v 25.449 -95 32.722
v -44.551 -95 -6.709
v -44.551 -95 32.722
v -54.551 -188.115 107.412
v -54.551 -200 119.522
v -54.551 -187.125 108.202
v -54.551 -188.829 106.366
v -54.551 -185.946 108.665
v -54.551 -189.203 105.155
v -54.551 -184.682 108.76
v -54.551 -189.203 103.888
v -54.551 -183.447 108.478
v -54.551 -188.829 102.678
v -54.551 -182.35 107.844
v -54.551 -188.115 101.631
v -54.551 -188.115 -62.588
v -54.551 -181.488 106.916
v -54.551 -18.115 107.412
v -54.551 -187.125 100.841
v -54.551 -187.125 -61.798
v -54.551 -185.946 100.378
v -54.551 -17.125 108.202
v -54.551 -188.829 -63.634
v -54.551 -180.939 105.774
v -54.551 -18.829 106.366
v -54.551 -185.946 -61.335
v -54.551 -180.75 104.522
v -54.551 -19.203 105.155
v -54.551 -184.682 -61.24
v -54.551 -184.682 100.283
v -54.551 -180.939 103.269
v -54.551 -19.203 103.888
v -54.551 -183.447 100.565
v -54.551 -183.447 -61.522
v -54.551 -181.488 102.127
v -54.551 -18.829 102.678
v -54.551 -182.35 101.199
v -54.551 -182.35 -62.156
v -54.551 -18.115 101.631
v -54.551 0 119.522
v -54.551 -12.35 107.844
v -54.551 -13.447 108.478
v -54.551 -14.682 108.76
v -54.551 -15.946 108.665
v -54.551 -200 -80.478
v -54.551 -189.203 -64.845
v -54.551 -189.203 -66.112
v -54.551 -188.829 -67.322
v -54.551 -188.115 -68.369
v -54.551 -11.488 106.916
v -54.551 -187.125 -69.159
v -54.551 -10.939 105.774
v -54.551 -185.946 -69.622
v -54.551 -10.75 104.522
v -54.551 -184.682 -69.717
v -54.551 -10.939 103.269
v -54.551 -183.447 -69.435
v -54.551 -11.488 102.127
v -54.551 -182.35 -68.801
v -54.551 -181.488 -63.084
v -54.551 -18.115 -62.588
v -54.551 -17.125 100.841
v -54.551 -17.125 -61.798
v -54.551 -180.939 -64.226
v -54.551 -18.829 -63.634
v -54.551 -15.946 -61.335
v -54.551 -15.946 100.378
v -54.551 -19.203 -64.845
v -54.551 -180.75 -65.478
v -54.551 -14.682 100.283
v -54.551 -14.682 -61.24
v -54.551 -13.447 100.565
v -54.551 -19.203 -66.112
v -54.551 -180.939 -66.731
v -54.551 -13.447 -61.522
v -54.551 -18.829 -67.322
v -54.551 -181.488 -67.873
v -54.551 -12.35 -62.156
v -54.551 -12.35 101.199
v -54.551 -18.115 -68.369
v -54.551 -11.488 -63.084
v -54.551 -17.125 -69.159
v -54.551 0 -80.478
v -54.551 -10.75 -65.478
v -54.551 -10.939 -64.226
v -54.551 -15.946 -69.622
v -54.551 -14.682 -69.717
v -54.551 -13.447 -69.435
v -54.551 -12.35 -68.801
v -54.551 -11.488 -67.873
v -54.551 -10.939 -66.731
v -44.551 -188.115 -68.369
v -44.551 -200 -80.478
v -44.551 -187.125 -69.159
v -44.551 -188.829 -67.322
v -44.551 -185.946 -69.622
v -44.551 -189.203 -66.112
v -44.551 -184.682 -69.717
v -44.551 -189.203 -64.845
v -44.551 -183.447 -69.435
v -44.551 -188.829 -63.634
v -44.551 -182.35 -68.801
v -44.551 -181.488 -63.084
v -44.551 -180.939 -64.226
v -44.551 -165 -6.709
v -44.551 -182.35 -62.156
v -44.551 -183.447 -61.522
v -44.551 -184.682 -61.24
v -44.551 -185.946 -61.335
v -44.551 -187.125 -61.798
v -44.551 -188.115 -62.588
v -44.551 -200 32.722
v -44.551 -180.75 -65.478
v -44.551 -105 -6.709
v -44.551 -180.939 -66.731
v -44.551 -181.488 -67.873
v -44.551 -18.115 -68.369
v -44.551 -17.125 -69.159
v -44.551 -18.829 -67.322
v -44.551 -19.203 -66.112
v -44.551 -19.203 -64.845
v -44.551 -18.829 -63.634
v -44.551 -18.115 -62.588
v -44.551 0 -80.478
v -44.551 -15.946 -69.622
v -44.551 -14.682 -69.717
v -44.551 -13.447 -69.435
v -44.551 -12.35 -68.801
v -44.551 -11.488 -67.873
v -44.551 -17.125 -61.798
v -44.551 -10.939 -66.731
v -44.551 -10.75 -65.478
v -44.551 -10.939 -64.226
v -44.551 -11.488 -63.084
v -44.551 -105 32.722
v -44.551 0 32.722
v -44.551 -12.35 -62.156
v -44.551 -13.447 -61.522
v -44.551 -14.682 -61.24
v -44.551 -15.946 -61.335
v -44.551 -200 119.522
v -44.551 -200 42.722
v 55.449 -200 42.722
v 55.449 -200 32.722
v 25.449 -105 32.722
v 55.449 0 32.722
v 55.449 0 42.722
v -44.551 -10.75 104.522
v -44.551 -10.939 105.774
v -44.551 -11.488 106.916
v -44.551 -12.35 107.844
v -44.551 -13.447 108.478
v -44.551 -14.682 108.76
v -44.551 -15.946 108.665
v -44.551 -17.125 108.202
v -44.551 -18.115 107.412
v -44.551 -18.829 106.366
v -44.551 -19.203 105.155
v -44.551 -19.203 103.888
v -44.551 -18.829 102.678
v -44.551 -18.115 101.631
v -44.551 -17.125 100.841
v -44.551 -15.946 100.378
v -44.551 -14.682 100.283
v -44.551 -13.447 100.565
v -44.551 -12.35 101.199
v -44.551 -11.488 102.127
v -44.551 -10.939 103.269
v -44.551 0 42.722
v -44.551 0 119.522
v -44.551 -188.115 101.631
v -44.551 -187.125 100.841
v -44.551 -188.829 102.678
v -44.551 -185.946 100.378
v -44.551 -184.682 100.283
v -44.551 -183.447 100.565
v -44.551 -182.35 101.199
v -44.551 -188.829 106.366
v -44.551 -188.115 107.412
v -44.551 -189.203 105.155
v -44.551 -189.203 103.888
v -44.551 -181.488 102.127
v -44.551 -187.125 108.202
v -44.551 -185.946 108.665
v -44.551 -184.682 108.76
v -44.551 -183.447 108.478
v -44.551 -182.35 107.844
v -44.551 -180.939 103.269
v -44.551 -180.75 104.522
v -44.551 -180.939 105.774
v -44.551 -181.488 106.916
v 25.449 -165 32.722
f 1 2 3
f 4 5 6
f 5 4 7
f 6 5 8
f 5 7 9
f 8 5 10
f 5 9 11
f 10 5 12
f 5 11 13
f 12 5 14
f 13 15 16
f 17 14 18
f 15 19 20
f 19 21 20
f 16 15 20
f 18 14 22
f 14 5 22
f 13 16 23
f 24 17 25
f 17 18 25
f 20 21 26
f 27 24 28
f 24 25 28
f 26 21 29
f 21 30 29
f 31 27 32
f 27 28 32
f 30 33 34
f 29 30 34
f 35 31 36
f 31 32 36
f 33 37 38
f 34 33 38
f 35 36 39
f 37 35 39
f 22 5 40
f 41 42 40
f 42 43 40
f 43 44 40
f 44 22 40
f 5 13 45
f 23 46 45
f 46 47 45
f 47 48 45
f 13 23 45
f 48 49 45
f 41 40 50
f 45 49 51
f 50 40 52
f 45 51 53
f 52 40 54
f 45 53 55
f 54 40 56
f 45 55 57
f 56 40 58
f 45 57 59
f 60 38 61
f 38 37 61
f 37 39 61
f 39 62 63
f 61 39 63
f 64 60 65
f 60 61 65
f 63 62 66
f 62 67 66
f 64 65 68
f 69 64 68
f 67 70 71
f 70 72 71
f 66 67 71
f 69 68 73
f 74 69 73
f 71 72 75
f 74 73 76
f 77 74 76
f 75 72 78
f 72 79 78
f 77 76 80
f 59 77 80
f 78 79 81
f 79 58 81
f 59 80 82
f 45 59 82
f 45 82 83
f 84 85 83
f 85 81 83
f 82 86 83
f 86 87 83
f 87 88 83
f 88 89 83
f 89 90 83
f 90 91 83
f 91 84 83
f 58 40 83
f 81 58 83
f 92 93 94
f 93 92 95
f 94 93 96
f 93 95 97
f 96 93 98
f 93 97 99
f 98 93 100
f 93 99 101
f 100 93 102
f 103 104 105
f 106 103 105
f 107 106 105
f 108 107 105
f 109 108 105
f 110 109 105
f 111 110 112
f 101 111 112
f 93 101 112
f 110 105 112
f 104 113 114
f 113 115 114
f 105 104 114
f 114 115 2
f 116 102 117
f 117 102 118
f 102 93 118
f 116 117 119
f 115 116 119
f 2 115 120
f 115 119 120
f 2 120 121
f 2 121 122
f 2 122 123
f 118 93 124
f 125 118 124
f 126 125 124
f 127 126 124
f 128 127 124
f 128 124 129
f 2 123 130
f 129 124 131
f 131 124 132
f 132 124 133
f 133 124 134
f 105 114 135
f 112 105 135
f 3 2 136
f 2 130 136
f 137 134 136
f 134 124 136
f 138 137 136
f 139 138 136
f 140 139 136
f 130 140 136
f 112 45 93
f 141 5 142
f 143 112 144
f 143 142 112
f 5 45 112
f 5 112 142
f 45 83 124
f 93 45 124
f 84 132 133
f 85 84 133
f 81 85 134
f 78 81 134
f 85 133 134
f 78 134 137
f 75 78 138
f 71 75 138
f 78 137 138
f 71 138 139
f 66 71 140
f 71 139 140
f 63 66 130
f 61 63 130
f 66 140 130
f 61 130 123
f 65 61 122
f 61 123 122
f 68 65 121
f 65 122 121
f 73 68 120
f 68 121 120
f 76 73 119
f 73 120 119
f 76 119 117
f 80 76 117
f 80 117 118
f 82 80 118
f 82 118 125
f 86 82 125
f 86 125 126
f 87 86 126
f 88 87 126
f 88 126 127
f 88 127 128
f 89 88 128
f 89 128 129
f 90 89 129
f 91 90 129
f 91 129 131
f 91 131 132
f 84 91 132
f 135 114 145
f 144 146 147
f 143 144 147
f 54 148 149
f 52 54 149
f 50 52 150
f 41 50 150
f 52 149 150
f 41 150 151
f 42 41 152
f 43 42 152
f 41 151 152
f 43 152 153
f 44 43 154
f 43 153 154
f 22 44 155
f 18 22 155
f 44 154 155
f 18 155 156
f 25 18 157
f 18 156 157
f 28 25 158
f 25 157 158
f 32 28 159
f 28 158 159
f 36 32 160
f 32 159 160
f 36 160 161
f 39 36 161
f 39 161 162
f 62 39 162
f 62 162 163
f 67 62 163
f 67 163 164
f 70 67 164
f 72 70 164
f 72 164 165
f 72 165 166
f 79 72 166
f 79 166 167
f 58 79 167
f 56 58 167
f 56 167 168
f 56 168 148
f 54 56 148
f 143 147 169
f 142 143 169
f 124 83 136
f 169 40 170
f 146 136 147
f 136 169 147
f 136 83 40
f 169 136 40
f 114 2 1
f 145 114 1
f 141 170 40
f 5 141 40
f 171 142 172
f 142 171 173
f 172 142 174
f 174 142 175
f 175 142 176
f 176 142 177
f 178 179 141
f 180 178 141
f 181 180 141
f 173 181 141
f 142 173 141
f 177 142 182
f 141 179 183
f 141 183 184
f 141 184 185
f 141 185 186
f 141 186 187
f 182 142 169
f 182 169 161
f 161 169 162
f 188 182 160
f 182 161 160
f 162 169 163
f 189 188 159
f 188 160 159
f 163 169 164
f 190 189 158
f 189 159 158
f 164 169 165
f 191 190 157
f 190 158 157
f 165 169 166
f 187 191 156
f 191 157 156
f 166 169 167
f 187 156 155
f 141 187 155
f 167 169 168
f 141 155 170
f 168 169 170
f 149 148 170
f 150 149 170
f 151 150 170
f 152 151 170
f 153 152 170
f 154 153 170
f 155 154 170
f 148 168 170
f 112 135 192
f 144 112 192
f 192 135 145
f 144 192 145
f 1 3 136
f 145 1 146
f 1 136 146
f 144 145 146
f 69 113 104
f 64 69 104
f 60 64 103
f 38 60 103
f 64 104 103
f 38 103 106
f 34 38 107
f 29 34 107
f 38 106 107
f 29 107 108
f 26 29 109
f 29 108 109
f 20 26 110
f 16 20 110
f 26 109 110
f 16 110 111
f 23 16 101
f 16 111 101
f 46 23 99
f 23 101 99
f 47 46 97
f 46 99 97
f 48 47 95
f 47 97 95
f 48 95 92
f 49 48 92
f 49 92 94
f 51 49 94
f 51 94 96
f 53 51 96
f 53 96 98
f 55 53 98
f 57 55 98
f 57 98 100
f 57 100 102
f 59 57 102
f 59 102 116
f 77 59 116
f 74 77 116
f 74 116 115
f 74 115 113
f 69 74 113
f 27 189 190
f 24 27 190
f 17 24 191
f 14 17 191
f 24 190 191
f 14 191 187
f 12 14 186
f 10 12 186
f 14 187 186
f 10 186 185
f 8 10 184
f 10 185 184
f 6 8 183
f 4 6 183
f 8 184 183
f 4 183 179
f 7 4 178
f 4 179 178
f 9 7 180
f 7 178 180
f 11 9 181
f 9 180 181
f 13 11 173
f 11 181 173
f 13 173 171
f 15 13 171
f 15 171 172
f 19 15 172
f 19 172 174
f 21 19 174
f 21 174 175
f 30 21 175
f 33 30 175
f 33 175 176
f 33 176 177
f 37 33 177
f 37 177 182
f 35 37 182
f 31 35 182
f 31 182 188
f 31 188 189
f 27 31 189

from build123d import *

# Parameters (mm, degrees)
F1_DEPTH = 200
F2_W     = 10
F2_H     = 39.4300983846
F3_DEPTH = 70
F5_DEPTH = 70
F7_D     = 8.5


with BuildPart() as f1:
    # F0 (on Front) → F1 (new body)
    with BuildSketch(Plane.XZ):
        Polygon((-44.5507265627, 119.5215136588), (-54.5507265627, 119.5215136588), (-54.5507265627, -80.4784863412), (-44.5507265627, -80.4784863412), (-44.5507265627, 32.7215136588), (55.4492734373, 32.7215136588), (55.4492734373, 42.7215136588), (-44.5507265627, 42.7215136588), align=None)
    extrude(amount=F1_DEPTH)

    # F2 (on face) → F3 (join)
    with BuildSketch(Plane.YZ.offset(-44.5507265627)):
        with Locations((-100, 13.0064644665)):
            Rectangle(F2_W, F2_H)
    extrude(amount=F3_DEPTH)

    # F4 (on face) → F5 (cut)
    with BuildSketch(Plane(origin=(0, -95, 0), x_dir=(-1, 0, 0), z_dir=(0, 1, 0))):
        Polygon((44.5507265627, -6.7085847259), (-25.4492734373, 32.7215136588), (-25.4492734373, -6.7085847259), align=None)
    extrude(amount=-F5_DEPTH, mode=Mode.SUBTRACT)

    # F7 (through all)
    with Locations(Plane(origin=(-54.5507265627, 0, 0), x_dir=(0, -1, 0), z_dir=(-1, 0, 0))):
        with Locations((185, 104.5215136588), (15, 104.5215136588), (15, -65.4784863412), (185, -65.4784863412)):
            Hole(F7_D / 2)


solid = f1.part
